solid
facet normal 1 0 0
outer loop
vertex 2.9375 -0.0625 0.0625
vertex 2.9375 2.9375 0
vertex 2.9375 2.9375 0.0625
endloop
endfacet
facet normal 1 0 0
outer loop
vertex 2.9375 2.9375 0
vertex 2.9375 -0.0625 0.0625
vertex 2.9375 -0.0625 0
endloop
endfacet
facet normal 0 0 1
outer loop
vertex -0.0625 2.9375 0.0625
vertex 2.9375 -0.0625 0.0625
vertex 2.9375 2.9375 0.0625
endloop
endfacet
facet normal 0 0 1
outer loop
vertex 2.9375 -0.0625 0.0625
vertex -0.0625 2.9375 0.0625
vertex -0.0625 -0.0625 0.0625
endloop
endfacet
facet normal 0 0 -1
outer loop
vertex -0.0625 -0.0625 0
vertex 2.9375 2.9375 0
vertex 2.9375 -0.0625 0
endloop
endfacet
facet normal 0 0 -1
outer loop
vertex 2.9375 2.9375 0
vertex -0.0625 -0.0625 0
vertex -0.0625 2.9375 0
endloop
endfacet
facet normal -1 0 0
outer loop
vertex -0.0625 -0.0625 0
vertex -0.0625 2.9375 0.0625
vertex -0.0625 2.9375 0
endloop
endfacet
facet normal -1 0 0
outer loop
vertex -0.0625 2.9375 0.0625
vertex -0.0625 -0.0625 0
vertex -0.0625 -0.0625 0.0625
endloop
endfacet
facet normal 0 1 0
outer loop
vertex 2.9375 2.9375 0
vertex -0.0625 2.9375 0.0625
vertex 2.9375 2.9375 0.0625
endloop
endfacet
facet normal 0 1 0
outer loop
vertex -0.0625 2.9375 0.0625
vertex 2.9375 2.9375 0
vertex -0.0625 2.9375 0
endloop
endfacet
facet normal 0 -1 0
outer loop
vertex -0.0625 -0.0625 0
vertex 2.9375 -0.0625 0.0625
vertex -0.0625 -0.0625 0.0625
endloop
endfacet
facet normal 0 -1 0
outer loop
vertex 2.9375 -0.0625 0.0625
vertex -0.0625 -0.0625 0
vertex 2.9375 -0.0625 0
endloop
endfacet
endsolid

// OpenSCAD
// element10.scad — straight belt tile
// Units: inches

straight   = true;
left_turn  = false;
right_turn = false;

plate_w = 2 + 7/8;
plate_d = 2 + 7/8;
plate_h = 1/16;
frame_w = 1/16;

belt_w    = 1.75;
belt_half = belt_w / 2;

hole_d = 3/32;
hole_r = hole_d / 2;

roller_count  = 13;
roller_h_size = 3/16;
roller_r      = roller_h_size / 2;
roller_inset  = plate_w / 20;
roller_x_lo   = 2 * roller_inset;
roller_x_hi   = plate_w - 2 * roller_inset;
roller_y_step = (plate_w - 2 * roller_inset) / 12;

b_L = plate_w / 2 - belt_half;
b_R = plate_w / 2 + belt_half;
nub = roller_x_hi - b_R;

arrow_w       = belt_w * 0.75;
arrow_shaft_w = arrow_w * 0.4;
arrow_shaft_h = 1.676;
arrow_head_h  = arrow_w / 2;
arrow_h       = arrow_shaft_h + arrow_head_h;
arrow_tip_y   = 3 * plate_d / 20 + 1/4 + 7 * plate_d / 10;
arrow_y       = arrow_tip_y - arrow_h;
arrow_outline = 1/16;
arrow_fill_w  = 2 * arrow_outline;

module rivet_holes() {
    spacing_x = plate_w / 10;
    spacing_y = plate_d / 10;
    inset_x   = spacing_x / 2;
    inset_y   = spacing_y / 2;
    for (i = [0:9]) {
        translate([inset_x,           inset_y + i * spacing_y, -1])
            cylinder(h = plate_h + 2, r = hole_r, $fn = 20);
        translate([plate_w - inset_x, inset_y + i * spacing_y, -1])
            cylinder(h = plate_h + 2, r = hole_r, $fn = 20);
        if (inset_x + i * spacing_x <= roller_x_lo + roller_r - hole_r ||
            inset_x + i * spacing_x >= roller_x_hi - roller_r + hole_r) {
            translate([inset_x + i * spacing_x, inset_y,           -1])
                cylinder(h = plate_h + 2, r = hole_r, $fn = 20);
            translate([inset_x + i * spacing_x, plate_d - inset_y, -1])
                cylinder(h = plate_h + 2, r = hole_r, $fn = 20);
        }
    }
}

module frame_with_id(colors = []) {
    id_cover = plate_h / 8;
    region_w = plate_w / 6;
    region_d = plate_d / 6;
    mark_h   = plate_h - id_cover;

    color("black")
    difference() {
        translate([-frame_w, -frame_w, 0])
            cube([plate_w + 2 * frame_w, plate_d + 2 * frame_w, plate_h]);
        translate([0, 0, -0.001])
            cube([plate_w, plate_d, plate_h + 0.002]);
        // top/bottom/left/right straight runs only — corners stay solid black
        translate([0, plate_d - 0.001, -0.001])
            cube([plate_w, frame_w + 0.002, plate_h + 0.002]);
        translate([0, -frame_w - 0.001, -0.001])
            cube([plate_w, frame_w + 0.002, plate_h + 0.002]);
        translate([-frame_w - 0.001, 0, -0.001])
            cube([frame_w + 0.002, plate_d, plate_h + 0.002]);
        translate([plate_w - 0.001, 0, -0.001])
            cube([frame_w + 0.002, plate_d, plate_h + 0.002]);
    }

    for (i = [0:5]) {
        c     = (colors[i] != undef) ? colors[i] : "black";

        // top edge
        color(c) translate([i * region_w, plate_d, 0]) cube([region_w, frame_w, mark_h]);
        color("black") translate([i * region_w, plate_d, mark_h]) cube([region_w, frame_w, id_cover]);

        // bottom edge (reversed)
        color(c) translate([(5-i) * region_w, -frame_w, 0]) cube([region_w, frame_w, mark_h]);
        color("black") translate([(5-i) * region_w, -frame_w, mark_h]) cube([region_w, frame_w, id_cover]);

        // left edge
        color(c) translate([-frame_w, i * region_d, 0]) cube([frame_w, region_d, mark_h]);
        color("black") translate([-frame_w, i * region_d, mark_h]) cube([frame_w, region_d, id_cover]);

        // right edge (reversed)
        color(c) translate([plate_w, (5-i) * region_d, 0]) cube([frame_w, region_d, mark_h]);
        color("black") translate([plate_w, (5-i) * region_d, mark_h]) cube([frame_w, region_d, id_cover]);
    }
}

module belt_cutout() {
    translate([(plate_w - belt_w) / 2, -0.001, -0.001])
        cube([belt_w, plate_d + 0.002, plate_h + 0.002]);
}

module roller_slots() {
    for (i = [0:roller_count - 1]) {
        cy = roller_inset + i * roller_y_step;
        translate([0, 0, -0.001])
        hull() {
            translate([roller_x_lo + roller_r, cy, 0])
                cylinder(h = plate_h + 0.002, r = roller_r, $fn = 20);
            translate([roller_x_hi - roller_r, cy, 0])
                cylinder(h = plate_h + 0.002, r = roller_r, $fn = 20);
        }
    }
}

module plate() {
    difference() {
        color("darkgray")
            cube([plate_w, plate_d, plate_h]);
        rivet_holes();
        roller_slots();
        belt_cutout();
    }
}

module rollers() {
    color("green")
    difference() {
        for (i = [0:roller_count - 1]) {
            cy = roller_inset + i * roller_y_step;
            hull() {
                translate([roller_x_lo + roller_r, cy, 0])
                    cylinder(h = plate_h, r = roller_r, $fn = 20);
                translate([roller_x_hi - roller_r, cy, 0])
                    cylinder(h = plate_h, r = roller_r, $fn = 20);
            }
        }
        belt_cutout();
    }
}

module rivets() {
    spacing_x = plate_w / 10;
    spacing_y = plate_d / 10;
    inset_x   = spacing_x / 2;
    inset_y   = spacing_y / 2;
    color("lightgray") {
        for (i = [0:9]) {
            translate([inset_x,           inset_y + i * spacing_y, 0])
                cylinder(h = plate_h, r = hole_r, $fn = 20);
            translate([plate_w - inset_x, inset_y + i * spacing_y, 0])
                cylinder(h = plate_h, r = hole_r, $fn = 20);
            if (inset_x + i * spacing_x <= roller_x_lo + roller_r - hole_r ||
            inset_x + i * spacing_x >= roller_x_hi - roller_r + hole_r) {
                translate([inset_x + i * spacing_x, inset_y,           0])
                    cylinder(h = plate_h, r = hole_r, $fn = 20);
                translate([inset_x + i * spacing_x, plate_d - inset_y, 0])
                    cylinder(h = plate_h, r = hole_r, $fn = 20);
            }
        }
    }
}

module arrow_2d() {
    polygon([
        [-arrow_shaft_w / 2, 0],
        [ arrow_shaft_w / 2, 0],
        [ arrow_shaft_w / 2, arrow_shaft_h],
        [ arrow_w / 2,       arrow_shaft_h],
        [ 0,                 arrow_h],
        [-arrow_w / 2,       arrow_shaft_h],
        [-arrow_shaft_w / 2, arrow_shaft_h]
    ]);
}

module arrow() {
    color("green")
    translate([plate_w / 2, arrow_y, 0])
    linear_extrude(plate_h)
    difference() {
        arrow_2d();
        offset(delta = -arrow_fill_w) arrow_2d();
    }
}

module belt() {
    color("black")
    difference() {
        translate([(plate_w - belt_w) / 2, 0, 0])
            cube([belt_w, plate_d, plate_h]);
        translate([plate_w / 2, arrow_y, -0.001])
        linear_extrude(plate_h + 0.002)
        difference() {
            arrow_2d();
            offset(delta = -arrow_fill_w) arrow_2d();
        }
    }
}

frame_with_id([undef, undef, "green", "green", undef, undef]);
plate();
rivets();
rollers();
belt();
arrow();
